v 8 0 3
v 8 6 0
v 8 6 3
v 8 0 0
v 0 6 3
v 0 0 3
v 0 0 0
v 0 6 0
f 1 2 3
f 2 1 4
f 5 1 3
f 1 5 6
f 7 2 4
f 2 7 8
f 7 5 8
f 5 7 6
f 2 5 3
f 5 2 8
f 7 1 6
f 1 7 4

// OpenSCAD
difference(){
	union(){


       translate([0,0,0]){
            cube([8,6,3], center=false);
        } 

	}
	union() {


      
	}
}
